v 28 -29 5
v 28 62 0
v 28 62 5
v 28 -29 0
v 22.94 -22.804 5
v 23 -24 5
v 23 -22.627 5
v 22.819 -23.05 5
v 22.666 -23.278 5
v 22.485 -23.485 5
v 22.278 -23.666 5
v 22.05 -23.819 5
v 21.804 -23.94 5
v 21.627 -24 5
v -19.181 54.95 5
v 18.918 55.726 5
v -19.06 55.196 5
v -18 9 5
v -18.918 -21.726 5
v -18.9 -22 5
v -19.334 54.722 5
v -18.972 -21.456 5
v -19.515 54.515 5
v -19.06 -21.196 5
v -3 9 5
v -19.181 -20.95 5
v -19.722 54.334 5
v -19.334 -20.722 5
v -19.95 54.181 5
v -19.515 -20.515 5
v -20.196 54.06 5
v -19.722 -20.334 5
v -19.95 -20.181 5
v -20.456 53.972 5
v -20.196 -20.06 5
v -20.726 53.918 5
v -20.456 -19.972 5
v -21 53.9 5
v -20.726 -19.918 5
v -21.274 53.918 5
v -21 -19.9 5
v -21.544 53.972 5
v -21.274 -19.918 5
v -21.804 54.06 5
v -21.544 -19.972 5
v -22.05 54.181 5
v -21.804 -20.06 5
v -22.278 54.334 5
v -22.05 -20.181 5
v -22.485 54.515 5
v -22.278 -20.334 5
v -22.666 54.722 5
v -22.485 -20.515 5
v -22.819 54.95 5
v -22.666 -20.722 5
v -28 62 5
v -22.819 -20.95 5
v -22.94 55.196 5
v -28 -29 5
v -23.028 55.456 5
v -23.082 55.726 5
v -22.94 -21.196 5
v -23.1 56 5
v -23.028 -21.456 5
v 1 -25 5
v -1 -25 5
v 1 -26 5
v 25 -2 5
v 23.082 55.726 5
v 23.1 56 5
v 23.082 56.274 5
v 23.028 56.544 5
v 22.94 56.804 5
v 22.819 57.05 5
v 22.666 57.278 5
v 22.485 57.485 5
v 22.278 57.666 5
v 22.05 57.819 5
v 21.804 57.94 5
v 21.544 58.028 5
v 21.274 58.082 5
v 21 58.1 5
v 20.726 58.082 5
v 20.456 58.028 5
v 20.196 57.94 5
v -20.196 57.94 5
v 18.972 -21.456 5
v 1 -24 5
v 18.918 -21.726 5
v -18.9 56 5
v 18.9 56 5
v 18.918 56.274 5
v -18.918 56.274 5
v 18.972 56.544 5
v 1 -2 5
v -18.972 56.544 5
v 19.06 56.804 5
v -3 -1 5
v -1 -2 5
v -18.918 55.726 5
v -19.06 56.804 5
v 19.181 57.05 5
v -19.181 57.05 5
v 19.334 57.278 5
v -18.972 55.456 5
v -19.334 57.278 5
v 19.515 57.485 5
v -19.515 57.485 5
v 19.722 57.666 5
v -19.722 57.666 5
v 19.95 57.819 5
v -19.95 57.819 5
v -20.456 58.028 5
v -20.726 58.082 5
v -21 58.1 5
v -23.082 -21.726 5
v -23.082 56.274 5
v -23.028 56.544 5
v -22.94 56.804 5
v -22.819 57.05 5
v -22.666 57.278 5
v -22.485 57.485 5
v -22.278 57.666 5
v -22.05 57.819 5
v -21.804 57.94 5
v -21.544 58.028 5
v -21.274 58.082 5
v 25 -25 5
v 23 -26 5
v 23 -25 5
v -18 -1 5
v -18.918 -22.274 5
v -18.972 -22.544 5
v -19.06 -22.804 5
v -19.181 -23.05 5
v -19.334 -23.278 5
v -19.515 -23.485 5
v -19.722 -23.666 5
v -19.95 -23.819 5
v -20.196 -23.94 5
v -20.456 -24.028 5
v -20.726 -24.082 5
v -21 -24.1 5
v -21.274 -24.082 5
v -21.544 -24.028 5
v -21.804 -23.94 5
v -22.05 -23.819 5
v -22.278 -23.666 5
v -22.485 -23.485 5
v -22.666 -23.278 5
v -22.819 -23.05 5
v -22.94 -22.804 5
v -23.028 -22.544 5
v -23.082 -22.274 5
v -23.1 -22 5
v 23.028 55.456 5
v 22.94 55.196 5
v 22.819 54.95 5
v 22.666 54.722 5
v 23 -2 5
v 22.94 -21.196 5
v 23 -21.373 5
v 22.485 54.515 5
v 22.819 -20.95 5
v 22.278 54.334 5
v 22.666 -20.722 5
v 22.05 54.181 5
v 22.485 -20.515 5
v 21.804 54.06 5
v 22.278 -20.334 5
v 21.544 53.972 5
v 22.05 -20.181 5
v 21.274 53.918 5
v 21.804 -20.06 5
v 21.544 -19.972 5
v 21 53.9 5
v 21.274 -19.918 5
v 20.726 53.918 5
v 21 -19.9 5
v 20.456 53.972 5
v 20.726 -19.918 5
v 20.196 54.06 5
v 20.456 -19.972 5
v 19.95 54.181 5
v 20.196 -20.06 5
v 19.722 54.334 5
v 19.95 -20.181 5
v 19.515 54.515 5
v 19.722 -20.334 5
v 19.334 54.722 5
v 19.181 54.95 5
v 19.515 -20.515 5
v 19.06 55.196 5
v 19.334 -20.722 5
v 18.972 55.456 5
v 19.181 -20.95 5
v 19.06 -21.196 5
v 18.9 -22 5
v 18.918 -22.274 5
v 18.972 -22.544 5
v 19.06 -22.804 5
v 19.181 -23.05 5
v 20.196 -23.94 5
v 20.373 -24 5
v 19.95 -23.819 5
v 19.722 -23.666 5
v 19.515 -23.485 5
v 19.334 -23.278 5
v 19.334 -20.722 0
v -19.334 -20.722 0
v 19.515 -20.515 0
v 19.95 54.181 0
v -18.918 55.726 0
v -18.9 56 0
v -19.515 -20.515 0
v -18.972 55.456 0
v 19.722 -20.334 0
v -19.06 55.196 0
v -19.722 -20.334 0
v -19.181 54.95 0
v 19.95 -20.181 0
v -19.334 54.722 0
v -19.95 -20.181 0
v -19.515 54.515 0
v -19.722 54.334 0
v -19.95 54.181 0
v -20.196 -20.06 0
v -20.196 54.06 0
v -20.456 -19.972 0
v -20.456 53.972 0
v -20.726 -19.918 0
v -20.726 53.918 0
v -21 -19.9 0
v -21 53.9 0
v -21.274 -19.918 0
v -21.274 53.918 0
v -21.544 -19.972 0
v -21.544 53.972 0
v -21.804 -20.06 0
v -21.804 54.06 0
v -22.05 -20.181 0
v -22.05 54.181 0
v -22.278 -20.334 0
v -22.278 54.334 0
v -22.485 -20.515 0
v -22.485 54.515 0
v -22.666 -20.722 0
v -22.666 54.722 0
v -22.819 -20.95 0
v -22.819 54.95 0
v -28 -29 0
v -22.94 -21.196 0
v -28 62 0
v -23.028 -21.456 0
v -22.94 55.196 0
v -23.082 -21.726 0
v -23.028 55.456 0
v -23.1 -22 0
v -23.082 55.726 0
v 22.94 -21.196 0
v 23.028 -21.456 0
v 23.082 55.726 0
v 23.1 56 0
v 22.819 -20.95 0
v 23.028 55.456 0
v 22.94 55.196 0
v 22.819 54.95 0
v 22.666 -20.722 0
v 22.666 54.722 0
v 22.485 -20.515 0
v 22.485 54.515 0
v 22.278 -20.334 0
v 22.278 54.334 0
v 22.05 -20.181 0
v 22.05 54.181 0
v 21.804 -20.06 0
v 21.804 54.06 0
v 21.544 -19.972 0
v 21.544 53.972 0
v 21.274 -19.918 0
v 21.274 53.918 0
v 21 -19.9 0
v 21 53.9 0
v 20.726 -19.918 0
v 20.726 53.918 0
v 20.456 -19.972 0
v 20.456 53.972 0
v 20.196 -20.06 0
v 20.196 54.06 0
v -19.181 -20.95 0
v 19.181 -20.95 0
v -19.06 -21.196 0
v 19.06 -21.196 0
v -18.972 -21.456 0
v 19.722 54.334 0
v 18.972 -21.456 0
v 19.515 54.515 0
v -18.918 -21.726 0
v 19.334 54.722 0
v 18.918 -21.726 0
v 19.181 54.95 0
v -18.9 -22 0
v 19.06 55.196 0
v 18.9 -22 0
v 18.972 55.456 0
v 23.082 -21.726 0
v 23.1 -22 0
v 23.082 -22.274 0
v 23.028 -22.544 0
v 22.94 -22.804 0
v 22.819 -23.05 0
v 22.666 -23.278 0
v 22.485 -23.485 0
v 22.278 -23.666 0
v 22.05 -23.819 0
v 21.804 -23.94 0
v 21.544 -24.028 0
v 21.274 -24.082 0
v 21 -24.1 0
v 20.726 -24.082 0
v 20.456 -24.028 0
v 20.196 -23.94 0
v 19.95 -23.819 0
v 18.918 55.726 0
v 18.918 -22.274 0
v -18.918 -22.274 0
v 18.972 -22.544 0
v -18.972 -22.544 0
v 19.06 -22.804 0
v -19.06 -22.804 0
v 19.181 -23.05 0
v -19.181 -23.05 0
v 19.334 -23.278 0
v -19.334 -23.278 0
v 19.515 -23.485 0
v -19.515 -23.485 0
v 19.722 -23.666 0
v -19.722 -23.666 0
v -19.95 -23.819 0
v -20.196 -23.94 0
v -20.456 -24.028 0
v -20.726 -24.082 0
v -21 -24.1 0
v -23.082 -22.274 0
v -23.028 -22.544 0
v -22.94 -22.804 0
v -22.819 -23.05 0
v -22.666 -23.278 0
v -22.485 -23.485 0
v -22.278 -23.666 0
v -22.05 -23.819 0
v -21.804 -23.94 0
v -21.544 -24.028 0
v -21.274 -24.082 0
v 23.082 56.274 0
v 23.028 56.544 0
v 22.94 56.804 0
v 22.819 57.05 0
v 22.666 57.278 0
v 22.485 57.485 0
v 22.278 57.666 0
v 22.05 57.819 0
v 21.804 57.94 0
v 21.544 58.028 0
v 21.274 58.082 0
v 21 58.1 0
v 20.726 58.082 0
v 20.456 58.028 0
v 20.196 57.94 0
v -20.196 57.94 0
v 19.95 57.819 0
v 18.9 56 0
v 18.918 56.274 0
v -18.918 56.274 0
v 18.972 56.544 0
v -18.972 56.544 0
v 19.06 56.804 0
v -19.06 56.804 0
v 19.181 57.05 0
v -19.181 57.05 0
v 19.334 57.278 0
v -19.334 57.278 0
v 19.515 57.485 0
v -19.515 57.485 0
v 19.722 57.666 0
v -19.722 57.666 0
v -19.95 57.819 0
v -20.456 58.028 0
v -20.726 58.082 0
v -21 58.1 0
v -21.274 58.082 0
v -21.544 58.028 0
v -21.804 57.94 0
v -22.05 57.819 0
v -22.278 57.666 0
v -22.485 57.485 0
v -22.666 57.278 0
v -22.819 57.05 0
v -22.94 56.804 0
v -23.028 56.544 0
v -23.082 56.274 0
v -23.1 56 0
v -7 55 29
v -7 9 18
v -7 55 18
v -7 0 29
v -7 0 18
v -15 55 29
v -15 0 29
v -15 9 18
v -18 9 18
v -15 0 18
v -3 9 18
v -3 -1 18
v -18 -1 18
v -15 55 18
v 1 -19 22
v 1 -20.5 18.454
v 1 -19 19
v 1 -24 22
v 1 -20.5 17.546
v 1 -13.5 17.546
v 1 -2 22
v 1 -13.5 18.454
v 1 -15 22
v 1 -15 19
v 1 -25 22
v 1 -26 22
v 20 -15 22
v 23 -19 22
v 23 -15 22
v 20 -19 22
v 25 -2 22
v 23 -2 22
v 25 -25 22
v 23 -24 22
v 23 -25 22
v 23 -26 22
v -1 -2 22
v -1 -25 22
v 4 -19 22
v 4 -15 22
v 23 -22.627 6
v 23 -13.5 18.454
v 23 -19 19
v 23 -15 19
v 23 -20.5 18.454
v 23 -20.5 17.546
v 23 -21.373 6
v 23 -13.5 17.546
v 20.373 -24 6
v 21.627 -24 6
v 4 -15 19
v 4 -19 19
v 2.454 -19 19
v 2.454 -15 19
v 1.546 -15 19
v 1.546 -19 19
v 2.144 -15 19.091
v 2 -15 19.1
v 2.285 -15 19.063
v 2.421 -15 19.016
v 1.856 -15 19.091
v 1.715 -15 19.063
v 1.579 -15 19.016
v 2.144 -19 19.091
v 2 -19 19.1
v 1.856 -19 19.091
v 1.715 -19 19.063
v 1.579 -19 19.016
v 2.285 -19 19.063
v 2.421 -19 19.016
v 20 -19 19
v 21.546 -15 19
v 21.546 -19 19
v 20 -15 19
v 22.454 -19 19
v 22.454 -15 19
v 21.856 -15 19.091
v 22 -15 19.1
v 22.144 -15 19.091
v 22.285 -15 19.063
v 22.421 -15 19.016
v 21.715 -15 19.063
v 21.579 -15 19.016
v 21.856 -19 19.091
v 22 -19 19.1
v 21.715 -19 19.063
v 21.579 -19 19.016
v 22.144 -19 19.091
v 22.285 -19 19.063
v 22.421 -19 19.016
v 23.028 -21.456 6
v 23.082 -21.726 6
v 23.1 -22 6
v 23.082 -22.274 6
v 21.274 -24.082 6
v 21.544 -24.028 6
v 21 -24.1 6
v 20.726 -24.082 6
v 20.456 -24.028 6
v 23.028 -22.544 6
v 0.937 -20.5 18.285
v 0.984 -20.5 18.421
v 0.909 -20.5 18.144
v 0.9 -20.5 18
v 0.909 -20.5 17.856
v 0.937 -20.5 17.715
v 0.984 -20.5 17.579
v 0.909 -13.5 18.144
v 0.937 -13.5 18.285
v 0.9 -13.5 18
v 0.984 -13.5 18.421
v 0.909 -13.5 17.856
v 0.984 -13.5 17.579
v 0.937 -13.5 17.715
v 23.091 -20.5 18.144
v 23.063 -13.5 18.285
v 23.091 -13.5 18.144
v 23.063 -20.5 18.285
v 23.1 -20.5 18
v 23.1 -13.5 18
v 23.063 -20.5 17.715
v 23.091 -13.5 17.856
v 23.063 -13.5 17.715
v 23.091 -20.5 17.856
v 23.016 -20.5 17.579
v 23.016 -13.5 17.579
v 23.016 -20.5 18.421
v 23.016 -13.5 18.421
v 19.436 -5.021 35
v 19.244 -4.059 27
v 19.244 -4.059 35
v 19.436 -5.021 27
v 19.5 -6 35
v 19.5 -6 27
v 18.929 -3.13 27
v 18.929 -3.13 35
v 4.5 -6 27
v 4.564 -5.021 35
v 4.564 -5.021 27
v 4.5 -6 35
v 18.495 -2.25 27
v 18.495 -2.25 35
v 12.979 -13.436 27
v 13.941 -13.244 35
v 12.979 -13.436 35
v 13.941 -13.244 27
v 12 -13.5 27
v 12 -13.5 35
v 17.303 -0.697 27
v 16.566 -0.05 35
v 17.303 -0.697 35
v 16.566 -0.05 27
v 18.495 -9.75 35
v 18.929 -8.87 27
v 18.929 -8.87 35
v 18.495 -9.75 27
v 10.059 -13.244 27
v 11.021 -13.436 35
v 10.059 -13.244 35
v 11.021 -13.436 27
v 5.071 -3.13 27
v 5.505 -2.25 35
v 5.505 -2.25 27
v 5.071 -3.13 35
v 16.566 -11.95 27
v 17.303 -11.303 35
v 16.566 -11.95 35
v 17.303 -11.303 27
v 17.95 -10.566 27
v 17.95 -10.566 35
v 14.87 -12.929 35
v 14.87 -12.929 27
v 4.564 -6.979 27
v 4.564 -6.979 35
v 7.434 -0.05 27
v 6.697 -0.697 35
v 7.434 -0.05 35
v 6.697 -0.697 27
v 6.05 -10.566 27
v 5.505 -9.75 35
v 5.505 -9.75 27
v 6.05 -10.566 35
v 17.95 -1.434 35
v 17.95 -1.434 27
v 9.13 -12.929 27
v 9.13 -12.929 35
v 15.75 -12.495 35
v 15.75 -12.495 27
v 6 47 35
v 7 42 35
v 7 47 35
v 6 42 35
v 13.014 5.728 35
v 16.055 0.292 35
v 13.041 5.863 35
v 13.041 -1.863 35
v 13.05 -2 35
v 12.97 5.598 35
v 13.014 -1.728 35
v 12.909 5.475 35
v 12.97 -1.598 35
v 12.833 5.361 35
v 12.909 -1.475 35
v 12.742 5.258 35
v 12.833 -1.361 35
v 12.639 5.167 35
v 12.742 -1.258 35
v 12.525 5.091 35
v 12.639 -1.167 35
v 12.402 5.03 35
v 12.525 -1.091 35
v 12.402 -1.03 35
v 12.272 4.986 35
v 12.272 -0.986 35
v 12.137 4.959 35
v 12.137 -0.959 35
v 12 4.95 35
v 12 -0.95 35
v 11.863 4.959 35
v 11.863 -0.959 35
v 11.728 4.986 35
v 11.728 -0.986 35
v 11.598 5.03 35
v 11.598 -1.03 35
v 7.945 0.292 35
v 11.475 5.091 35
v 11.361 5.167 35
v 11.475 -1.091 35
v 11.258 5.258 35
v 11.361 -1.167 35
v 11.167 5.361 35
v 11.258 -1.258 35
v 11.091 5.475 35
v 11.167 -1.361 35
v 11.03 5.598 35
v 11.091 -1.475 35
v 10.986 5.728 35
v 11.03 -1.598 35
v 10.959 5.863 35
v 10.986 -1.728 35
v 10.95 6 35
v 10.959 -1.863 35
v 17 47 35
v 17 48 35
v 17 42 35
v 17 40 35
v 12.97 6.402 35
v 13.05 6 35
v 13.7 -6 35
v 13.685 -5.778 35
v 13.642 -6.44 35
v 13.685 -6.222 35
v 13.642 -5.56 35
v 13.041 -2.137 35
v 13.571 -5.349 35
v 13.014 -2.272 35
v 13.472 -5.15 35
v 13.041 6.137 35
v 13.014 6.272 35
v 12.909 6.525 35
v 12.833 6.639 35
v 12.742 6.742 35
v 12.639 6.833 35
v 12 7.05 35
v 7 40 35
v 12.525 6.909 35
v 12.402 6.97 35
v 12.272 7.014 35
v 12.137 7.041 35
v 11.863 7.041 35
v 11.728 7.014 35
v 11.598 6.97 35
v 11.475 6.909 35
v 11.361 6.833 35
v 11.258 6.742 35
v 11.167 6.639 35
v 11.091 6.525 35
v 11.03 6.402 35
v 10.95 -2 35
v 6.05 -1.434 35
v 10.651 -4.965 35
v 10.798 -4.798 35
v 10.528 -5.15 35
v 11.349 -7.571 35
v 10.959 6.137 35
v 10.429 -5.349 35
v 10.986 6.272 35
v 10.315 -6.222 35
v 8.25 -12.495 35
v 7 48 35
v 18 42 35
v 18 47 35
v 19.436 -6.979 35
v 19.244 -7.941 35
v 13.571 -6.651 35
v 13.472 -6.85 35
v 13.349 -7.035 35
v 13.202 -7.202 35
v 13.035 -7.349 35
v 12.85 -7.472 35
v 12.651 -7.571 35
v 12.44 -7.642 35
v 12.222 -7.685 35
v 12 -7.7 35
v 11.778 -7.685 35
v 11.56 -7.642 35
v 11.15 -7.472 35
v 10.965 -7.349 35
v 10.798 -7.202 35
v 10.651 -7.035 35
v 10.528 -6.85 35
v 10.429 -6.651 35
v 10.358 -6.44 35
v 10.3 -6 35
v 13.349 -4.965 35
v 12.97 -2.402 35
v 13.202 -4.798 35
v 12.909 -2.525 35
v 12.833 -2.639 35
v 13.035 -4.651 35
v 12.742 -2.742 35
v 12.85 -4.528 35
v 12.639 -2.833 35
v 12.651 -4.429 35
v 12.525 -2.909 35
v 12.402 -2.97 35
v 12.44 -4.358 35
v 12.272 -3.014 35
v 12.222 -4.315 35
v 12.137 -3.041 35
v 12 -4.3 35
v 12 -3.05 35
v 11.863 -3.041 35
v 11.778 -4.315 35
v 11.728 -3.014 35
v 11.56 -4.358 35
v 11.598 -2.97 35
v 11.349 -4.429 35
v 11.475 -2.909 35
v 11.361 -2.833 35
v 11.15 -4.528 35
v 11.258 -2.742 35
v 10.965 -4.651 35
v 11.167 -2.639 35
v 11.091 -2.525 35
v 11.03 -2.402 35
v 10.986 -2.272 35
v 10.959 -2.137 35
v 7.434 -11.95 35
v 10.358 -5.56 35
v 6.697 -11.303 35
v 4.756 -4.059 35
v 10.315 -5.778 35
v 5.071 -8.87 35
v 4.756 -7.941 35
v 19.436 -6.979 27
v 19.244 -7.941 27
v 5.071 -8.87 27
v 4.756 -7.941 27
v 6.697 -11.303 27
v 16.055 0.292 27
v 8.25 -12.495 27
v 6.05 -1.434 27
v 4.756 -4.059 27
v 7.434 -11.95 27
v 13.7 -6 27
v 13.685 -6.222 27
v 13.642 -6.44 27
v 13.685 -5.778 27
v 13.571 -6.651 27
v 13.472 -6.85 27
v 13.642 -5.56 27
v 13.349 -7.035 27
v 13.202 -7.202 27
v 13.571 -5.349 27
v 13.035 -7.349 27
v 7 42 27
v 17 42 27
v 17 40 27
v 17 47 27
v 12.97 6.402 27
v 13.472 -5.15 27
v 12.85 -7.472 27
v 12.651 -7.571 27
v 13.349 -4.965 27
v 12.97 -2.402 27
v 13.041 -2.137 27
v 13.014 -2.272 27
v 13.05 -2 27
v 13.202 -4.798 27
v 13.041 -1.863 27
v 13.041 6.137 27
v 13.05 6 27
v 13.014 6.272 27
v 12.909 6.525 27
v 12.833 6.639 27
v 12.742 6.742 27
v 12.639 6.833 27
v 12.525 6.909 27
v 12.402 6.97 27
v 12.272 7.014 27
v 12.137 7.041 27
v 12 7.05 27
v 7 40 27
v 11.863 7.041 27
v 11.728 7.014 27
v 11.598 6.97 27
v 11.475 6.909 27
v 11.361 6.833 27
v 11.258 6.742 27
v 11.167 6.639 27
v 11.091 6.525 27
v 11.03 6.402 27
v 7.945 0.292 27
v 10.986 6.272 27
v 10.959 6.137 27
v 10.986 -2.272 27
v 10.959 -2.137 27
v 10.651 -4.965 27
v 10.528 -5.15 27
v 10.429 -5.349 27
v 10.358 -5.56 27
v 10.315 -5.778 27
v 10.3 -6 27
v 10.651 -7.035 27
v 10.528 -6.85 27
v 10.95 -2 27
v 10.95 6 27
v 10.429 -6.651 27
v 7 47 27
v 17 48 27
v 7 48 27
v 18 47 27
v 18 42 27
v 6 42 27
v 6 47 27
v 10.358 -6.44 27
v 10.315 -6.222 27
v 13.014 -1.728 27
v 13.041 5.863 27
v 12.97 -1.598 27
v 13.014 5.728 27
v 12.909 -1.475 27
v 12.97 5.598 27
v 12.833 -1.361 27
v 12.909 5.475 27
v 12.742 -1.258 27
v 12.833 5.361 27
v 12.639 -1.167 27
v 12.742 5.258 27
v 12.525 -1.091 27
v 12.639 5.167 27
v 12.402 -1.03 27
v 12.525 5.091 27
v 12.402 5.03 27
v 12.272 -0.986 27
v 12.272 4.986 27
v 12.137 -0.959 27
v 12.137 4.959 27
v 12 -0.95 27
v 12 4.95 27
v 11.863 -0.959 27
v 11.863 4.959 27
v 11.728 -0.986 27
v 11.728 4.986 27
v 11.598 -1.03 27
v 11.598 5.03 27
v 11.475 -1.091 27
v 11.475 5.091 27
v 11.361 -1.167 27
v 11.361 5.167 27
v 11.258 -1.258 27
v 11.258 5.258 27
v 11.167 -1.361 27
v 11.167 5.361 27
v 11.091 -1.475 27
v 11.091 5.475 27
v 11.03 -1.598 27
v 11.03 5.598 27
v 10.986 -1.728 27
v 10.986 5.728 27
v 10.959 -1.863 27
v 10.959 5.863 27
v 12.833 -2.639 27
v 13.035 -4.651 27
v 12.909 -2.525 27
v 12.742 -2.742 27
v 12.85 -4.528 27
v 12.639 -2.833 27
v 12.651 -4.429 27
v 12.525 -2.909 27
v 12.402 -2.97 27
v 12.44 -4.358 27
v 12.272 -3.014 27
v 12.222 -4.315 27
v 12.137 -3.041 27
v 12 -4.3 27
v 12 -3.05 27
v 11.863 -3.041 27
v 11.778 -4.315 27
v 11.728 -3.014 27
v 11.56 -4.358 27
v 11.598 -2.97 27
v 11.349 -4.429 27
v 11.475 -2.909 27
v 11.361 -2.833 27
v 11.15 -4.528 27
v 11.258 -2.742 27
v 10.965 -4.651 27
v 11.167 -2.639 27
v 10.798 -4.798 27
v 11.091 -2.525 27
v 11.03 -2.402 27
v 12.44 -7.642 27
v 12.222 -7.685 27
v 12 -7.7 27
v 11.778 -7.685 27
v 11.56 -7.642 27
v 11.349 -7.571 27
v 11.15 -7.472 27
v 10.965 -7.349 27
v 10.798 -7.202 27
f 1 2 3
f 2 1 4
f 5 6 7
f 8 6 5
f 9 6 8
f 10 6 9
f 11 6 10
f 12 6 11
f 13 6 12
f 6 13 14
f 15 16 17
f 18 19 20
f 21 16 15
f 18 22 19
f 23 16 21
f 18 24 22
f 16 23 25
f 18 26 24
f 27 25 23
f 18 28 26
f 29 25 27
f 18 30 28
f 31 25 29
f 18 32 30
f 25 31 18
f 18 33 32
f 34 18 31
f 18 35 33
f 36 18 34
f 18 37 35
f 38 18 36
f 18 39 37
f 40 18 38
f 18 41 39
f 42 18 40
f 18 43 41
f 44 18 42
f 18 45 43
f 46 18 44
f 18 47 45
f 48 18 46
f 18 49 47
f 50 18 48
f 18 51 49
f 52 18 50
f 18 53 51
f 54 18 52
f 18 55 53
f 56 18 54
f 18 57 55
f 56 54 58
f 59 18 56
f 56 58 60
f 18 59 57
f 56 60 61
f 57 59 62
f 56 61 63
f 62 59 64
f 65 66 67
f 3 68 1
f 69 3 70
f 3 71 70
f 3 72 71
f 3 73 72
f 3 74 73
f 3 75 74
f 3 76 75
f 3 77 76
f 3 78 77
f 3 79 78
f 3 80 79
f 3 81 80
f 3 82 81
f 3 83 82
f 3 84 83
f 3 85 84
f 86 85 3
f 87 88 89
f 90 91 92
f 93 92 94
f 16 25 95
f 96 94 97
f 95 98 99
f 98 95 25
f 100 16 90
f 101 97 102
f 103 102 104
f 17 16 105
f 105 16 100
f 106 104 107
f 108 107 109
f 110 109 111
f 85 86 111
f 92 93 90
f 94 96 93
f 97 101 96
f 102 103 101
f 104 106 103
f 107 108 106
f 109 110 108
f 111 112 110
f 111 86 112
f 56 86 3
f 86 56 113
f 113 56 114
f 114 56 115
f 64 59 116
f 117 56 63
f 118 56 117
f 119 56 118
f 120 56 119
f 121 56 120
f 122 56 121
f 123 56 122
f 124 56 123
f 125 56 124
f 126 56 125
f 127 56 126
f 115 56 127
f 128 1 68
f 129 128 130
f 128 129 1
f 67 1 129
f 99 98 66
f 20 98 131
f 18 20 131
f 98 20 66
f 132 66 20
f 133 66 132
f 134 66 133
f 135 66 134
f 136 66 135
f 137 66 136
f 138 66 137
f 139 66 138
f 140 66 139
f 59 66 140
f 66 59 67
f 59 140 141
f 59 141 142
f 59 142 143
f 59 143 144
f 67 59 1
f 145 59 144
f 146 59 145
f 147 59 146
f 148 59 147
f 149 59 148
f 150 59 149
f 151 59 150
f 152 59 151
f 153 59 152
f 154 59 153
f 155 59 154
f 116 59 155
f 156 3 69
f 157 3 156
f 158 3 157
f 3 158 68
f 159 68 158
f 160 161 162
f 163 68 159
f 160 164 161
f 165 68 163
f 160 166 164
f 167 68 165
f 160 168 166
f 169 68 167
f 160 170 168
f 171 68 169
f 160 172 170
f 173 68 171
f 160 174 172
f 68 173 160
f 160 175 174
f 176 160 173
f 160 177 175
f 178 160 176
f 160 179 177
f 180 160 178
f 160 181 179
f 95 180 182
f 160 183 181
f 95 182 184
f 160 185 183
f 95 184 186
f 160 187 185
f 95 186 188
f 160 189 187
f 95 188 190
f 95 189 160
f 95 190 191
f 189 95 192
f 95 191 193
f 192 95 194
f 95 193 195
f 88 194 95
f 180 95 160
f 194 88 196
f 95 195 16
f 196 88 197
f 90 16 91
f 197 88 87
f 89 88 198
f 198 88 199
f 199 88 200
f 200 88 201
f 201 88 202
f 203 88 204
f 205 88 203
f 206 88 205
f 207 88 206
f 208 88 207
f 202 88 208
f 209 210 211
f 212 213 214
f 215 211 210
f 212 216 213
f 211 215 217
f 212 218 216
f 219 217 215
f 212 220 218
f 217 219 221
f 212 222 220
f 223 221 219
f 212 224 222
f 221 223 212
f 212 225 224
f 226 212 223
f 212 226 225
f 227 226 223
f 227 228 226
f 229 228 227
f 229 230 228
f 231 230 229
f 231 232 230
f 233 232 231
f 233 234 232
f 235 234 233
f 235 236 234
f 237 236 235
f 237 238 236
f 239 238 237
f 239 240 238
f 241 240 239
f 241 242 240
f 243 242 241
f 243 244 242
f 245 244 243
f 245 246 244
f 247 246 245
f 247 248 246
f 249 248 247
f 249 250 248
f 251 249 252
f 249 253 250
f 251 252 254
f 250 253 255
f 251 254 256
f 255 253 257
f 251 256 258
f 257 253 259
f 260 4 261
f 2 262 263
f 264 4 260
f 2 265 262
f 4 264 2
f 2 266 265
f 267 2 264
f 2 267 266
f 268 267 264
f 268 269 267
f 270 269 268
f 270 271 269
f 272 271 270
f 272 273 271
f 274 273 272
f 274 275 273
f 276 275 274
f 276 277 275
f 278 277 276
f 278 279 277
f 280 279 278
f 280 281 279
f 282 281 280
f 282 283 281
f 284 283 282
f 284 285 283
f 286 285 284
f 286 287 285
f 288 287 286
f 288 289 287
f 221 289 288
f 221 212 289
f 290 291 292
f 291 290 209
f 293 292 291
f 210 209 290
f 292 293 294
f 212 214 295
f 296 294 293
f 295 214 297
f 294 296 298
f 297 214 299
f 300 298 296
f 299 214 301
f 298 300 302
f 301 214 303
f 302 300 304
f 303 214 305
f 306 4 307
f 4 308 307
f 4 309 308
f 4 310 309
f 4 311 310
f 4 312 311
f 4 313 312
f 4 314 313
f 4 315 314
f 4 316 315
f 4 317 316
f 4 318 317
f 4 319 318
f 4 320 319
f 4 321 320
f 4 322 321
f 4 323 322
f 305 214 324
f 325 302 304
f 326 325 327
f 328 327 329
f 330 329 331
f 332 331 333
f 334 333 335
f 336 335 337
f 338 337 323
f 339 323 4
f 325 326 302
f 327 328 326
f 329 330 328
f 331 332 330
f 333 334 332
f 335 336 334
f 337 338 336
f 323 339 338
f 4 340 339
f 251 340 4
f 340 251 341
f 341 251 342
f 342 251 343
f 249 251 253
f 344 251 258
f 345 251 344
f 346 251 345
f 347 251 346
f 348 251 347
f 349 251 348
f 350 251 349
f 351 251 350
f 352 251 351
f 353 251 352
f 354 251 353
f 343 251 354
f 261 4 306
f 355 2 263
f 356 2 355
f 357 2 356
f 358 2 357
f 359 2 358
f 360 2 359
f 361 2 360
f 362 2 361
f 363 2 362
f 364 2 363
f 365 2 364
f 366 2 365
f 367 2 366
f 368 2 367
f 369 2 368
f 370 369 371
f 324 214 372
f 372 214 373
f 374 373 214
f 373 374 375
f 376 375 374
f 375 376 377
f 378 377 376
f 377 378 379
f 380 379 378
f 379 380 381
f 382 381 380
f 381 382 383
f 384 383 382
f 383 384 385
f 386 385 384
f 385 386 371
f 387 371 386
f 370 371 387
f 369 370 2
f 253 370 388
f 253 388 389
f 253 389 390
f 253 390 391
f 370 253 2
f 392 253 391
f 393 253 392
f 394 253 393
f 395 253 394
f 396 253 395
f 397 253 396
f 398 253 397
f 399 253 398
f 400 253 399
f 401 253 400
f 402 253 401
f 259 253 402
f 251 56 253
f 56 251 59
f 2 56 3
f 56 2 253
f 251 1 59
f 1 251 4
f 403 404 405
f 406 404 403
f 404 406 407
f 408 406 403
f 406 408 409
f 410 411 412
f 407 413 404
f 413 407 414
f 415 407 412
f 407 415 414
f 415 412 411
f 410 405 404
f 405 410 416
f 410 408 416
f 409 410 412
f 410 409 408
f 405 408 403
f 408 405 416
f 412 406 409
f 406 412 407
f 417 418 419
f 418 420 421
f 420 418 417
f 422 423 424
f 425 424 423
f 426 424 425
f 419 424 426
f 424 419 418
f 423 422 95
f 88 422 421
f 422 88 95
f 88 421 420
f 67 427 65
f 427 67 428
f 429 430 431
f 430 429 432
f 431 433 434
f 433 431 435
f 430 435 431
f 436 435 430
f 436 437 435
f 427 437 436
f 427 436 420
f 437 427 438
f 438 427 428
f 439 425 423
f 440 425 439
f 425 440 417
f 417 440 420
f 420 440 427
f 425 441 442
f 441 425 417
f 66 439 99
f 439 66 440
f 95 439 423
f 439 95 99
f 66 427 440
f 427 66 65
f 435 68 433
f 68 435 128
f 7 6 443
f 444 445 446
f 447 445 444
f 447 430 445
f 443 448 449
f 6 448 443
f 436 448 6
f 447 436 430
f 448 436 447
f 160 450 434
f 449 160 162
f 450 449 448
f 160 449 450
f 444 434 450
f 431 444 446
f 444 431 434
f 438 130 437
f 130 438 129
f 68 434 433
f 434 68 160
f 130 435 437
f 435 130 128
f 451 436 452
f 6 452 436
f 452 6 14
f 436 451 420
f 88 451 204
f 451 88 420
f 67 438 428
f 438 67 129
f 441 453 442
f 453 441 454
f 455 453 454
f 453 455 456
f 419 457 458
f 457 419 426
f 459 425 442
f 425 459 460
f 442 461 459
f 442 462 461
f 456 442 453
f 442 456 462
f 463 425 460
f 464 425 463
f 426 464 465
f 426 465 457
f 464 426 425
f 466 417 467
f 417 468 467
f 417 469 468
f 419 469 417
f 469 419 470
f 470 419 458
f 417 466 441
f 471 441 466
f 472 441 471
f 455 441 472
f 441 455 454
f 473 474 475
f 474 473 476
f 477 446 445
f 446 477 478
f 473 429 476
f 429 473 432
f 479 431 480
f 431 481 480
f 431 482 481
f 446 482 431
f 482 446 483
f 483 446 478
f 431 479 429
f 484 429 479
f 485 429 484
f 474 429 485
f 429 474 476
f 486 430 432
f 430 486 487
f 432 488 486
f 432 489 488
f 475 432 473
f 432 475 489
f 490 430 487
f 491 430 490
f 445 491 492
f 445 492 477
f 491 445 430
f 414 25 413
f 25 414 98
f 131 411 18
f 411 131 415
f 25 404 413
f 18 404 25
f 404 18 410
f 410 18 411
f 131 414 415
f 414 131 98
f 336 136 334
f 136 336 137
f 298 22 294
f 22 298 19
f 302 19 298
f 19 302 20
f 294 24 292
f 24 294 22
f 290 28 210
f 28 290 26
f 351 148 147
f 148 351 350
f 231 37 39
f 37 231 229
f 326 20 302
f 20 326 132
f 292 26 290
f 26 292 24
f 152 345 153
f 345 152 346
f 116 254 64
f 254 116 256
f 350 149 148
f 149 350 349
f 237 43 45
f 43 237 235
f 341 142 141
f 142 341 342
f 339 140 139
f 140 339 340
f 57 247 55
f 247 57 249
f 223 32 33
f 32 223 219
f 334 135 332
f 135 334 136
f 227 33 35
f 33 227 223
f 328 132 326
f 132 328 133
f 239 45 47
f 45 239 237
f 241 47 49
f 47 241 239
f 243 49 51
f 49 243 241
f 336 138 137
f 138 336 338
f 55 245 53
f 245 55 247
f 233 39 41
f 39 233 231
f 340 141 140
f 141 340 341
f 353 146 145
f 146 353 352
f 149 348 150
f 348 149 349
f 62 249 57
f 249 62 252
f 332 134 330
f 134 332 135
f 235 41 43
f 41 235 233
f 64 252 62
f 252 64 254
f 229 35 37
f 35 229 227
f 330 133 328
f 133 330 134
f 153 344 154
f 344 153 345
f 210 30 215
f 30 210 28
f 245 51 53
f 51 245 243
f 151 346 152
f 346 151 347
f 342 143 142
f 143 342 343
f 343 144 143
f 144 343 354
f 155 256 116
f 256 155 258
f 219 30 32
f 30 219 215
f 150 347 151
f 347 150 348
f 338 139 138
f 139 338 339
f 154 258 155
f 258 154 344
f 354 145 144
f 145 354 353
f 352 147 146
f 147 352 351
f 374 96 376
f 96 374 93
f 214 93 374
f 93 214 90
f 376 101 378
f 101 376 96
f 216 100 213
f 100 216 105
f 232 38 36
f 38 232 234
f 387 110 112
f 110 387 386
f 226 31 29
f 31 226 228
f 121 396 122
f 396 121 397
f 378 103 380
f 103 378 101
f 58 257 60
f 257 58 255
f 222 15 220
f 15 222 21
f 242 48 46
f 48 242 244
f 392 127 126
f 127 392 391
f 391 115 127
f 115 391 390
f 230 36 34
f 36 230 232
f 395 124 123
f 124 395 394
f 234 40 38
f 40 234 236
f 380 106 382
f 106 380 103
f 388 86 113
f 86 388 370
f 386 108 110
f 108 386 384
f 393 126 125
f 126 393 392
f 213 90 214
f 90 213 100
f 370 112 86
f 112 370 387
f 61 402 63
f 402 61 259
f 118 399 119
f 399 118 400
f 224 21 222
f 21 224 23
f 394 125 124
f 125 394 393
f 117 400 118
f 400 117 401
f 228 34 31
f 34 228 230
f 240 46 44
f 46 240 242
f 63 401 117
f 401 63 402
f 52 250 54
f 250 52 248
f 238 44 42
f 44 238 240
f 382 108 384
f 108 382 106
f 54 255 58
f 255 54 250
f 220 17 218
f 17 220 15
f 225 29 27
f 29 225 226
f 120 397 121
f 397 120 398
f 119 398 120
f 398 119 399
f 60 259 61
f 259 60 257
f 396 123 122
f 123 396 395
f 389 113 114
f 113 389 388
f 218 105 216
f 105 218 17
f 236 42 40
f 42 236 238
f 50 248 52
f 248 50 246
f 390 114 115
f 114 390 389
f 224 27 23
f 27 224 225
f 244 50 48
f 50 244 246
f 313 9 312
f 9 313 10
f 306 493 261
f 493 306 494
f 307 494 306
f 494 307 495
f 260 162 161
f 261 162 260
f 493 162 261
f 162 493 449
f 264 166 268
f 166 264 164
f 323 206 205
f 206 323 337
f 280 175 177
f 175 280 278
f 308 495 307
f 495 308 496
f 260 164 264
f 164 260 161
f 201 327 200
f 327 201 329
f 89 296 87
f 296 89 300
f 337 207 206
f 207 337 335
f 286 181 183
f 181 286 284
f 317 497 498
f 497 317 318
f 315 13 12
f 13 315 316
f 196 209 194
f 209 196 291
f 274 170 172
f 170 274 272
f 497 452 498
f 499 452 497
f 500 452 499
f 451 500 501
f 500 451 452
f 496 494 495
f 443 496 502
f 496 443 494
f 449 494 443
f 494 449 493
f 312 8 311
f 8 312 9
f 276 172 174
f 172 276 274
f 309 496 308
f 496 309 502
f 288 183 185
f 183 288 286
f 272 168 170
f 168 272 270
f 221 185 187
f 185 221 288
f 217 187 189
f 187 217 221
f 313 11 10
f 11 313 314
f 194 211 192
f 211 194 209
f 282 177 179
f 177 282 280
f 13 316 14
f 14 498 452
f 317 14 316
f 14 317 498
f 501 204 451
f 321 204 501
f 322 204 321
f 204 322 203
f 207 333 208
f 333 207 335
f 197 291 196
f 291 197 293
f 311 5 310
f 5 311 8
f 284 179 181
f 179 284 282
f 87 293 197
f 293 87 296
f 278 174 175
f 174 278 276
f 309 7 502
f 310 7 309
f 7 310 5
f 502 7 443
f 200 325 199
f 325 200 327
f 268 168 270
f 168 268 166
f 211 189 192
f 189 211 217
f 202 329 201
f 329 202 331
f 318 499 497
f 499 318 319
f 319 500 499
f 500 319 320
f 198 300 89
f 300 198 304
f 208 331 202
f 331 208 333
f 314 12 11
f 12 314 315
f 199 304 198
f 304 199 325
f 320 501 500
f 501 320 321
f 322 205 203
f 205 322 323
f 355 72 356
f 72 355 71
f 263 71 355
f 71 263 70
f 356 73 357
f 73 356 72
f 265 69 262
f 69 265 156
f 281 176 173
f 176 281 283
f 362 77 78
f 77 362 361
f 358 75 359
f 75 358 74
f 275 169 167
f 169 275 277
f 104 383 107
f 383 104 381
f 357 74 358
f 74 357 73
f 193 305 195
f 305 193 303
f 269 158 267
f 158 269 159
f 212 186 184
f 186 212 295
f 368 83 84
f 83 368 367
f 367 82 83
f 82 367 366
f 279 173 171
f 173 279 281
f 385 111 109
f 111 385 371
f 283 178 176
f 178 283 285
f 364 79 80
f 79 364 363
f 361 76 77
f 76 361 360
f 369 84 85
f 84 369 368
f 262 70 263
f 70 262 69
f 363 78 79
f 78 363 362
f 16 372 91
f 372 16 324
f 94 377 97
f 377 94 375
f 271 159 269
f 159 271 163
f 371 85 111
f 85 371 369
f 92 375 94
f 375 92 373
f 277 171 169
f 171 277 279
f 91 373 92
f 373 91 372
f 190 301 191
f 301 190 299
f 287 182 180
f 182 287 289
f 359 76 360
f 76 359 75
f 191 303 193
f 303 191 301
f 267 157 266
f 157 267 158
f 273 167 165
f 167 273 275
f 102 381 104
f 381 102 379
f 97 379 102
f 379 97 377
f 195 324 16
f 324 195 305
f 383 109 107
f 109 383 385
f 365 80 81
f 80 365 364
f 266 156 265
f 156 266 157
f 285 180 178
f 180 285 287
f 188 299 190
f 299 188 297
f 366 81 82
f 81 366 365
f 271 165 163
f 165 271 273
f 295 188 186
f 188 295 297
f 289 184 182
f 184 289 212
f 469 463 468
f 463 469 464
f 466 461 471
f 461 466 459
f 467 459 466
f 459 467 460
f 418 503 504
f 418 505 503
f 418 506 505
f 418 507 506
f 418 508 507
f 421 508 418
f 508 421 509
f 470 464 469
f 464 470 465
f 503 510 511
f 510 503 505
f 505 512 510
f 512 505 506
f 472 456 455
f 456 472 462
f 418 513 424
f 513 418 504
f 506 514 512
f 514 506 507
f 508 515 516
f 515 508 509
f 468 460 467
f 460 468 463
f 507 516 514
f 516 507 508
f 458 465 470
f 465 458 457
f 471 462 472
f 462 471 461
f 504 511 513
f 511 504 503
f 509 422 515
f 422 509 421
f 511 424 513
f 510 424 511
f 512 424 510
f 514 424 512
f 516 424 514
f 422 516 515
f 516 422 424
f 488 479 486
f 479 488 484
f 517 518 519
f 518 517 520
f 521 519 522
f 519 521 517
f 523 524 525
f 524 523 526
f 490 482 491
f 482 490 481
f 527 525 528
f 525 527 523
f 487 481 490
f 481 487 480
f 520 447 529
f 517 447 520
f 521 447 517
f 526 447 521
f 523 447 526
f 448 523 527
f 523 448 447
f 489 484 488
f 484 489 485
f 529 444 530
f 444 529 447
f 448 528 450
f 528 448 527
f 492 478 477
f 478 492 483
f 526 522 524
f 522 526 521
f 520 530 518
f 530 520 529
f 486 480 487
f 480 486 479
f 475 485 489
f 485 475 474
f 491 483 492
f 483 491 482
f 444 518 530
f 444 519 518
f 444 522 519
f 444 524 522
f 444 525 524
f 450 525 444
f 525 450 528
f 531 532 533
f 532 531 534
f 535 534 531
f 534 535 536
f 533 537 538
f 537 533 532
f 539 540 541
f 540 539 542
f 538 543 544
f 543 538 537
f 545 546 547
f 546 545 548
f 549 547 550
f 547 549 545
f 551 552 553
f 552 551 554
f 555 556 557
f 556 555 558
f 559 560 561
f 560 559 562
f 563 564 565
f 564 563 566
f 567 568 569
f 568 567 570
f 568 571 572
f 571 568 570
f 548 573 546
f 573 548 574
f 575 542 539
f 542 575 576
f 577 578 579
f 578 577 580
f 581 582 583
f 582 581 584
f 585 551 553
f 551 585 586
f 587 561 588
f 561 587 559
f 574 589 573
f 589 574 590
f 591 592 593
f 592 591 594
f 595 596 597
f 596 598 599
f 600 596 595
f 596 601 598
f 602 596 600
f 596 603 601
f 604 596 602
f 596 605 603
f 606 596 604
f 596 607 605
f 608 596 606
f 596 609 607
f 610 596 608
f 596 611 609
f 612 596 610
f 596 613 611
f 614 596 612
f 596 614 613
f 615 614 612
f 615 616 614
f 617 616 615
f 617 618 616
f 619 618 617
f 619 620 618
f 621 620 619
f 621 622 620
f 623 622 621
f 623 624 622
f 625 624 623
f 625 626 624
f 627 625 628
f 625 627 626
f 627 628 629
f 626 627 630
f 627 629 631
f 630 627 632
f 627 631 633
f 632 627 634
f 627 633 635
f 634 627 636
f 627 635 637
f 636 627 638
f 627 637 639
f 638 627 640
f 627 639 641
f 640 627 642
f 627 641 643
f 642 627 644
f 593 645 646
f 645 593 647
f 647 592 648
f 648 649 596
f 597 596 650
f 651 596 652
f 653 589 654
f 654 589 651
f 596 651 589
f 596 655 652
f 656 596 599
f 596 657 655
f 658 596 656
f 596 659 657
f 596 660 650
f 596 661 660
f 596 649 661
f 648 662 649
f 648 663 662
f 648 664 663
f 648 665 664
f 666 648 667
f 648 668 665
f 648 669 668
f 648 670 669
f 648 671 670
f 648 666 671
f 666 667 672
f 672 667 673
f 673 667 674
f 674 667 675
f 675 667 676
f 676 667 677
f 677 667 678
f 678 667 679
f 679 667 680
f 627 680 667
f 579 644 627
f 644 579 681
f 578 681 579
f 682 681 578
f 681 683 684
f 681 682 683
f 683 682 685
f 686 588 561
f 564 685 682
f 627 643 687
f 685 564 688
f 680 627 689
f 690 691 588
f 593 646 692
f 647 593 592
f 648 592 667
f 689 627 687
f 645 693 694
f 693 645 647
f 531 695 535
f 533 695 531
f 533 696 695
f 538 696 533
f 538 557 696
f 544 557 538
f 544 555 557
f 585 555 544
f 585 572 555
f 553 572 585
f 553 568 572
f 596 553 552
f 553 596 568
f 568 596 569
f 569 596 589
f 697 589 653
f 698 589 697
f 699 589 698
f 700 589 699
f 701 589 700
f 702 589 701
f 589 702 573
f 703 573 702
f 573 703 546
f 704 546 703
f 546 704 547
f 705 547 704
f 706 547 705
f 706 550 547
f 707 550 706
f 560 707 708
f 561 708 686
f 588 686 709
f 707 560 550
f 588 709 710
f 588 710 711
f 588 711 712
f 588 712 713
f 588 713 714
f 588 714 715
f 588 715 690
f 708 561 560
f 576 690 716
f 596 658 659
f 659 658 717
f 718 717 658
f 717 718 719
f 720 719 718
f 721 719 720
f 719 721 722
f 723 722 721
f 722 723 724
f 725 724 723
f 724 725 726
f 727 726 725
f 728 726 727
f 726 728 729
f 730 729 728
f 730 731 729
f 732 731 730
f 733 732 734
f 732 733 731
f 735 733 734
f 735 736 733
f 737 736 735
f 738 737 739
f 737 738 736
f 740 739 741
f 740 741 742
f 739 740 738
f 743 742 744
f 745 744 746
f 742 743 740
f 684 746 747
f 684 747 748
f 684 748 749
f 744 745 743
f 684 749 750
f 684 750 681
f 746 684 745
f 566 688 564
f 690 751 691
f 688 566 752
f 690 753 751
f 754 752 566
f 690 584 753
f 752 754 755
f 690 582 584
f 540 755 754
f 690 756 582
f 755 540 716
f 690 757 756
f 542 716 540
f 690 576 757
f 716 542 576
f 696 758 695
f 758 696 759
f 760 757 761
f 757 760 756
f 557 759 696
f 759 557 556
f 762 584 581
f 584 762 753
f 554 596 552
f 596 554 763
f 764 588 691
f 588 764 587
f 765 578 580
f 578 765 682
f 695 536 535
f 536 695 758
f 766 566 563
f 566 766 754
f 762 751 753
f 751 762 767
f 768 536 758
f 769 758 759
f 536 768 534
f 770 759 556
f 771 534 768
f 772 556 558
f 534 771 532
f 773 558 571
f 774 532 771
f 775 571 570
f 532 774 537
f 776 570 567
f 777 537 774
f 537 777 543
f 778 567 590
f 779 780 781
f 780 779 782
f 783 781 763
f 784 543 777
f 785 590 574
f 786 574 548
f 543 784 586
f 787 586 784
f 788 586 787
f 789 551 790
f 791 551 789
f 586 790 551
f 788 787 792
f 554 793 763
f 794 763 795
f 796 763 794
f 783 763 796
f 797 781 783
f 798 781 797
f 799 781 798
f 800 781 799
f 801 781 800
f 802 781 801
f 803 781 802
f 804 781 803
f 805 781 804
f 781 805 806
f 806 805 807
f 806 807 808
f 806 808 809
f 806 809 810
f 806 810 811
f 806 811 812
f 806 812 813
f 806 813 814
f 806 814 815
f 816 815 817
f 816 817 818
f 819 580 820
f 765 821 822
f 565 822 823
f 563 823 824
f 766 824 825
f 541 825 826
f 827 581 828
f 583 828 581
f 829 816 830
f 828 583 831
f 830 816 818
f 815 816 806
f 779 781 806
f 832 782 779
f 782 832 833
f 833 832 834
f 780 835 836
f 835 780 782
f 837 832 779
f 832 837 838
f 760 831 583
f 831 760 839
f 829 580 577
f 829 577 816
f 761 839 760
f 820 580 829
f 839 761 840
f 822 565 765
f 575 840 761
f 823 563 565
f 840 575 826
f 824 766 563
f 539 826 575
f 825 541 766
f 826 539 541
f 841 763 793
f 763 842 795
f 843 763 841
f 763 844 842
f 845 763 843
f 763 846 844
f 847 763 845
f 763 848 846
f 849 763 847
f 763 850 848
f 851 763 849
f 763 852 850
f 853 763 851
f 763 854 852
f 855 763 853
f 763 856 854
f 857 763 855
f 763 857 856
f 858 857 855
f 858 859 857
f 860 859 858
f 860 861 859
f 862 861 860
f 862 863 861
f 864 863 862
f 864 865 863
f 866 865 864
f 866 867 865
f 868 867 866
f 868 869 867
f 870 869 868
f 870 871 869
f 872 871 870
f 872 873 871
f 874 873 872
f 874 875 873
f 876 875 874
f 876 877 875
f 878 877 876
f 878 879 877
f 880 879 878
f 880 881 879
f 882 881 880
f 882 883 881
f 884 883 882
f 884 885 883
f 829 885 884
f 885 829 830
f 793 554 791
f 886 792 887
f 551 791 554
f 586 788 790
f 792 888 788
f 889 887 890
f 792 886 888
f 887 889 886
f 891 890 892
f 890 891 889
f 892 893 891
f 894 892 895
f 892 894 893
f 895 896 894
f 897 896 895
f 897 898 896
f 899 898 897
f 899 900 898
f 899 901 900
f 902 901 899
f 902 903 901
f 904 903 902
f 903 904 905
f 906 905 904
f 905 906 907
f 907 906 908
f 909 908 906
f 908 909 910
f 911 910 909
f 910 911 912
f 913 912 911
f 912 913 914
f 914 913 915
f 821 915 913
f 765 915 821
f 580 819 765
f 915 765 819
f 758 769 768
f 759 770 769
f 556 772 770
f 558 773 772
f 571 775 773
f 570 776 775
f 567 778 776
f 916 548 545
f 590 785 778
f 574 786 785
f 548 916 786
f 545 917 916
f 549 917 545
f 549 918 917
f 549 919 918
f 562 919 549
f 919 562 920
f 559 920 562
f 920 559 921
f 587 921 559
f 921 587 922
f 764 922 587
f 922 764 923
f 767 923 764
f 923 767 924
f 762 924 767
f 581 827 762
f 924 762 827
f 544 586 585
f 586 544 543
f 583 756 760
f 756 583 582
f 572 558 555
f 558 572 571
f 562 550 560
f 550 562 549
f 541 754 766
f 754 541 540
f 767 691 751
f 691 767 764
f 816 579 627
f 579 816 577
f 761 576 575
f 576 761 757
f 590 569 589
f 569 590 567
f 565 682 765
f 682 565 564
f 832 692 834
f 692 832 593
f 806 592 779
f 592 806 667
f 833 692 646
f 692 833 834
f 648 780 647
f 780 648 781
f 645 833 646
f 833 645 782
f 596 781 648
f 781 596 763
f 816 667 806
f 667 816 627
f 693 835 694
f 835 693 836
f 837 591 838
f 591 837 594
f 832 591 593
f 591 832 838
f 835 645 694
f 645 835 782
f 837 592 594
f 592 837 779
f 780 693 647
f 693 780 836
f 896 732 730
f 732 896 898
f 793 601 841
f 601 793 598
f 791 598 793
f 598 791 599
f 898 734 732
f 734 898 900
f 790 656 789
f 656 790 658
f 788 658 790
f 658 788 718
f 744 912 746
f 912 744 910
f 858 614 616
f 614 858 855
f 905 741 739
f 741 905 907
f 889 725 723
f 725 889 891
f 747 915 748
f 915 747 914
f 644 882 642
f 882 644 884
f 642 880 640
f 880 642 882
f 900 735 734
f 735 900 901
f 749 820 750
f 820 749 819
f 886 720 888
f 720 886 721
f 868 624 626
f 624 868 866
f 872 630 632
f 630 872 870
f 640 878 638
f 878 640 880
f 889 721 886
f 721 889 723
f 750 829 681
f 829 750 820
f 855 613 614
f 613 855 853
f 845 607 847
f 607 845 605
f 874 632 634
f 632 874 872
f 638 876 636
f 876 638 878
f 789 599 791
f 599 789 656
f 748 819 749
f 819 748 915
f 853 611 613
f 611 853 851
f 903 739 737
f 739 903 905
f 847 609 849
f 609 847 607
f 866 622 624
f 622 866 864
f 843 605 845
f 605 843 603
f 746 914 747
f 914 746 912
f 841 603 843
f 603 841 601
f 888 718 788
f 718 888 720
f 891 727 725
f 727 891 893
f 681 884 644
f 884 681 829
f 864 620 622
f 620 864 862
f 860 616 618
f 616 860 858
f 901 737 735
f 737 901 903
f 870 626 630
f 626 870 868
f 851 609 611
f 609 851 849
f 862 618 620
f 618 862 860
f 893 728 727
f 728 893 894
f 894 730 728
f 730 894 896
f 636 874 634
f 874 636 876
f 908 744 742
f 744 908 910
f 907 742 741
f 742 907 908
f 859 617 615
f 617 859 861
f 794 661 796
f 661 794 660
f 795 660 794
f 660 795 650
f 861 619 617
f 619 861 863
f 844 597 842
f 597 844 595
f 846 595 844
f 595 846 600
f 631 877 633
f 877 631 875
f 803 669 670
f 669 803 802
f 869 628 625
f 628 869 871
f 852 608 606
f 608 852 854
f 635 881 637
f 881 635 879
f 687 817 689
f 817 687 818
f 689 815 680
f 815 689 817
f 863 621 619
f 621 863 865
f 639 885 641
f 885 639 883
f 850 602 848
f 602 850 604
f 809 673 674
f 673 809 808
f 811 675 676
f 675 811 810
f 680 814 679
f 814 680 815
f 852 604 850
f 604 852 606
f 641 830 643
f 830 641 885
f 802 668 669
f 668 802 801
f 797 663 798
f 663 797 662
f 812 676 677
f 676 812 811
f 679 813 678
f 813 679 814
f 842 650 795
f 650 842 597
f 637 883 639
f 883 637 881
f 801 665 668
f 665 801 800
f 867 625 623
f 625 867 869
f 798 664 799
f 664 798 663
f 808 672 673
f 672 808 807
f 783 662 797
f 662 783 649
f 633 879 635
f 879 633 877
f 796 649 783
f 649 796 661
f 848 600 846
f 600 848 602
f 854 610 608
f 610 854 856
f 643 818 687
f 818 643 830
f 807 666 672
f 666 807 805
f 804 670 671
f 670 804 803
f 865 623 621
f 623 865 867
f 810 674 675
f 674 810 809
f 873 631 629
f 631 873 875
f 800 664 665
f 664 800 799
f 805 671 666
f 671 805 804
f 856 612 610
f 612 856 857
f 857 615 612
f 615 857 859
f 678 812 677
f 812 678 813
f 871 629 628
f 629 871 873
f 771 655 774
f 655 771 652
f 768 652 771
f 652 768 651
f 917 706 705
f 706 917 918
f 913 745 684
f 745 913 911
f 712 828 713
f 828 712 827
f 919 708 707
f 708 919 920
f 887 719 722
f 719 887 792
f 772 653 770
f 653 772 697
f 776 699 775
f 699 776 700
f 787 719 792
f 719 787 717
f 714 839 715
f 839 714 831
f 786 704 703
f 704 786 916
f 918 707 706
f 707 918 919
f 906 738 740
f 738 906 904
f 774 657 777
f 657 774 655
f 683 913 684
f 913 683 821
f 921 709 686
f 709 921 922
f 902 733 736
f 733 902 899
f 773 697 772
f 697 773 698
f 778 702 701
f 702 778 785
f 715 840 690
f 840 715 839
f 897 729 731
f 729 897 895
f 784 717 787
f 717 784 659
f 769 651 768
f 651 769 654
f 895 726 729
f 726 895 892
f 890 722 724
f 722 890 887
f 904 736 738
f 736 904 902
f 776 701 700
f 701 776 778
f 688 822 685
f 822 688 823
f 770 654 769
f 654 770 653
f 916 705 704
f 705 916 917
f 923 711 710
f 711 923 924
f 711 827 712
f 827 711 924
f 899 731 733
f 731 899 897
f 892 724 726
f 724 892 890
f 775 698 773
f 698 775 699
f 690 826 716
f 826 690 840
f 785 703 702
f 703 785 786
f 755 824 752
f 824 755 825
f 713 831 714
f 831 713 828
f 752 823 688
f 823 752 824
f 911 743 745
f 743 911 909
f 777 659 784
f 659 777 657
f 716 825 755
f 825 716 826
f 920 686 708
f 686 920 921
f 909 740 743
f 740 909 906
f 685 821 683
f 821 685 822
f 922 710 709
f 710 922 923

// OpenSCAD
// SG90 Quick Gripper: single fixed finger + one direct-drive moving finger
// Units: mm. Designed as a low-part-count classroom / competition prototype.
// Print base and moving_jaw separately; moving_jaw bolts to a standard SG90 single-arm horn.
$fn = 48;
part = "assembly"; // [assembly,base,moving_jaw]
open_angle = 0;       // preview pose, degrees from forward
closed_angle = 20;    // rotate servo horn to this angle for a narrow grip
jaw_angle = open_angle;
plate_t = 5;

module base() {
  difference() {
    union() {
      // Flat, printable mounting plate
      translate([-28,-29,0]) cube([56,91,plate_t]);
      // Fixed finger, aligned parallel with the moving finger when open
      translate([-15,0,18]) cube([8,55,11]);
      // SG90 cradle: low side rails and rear stop for a servo sitting upright
      translate([-1,-25,plate_t]) cube([2,23,17]);
      translate([23,-25,plate_t]) cube([2,23,17]);
      translate([1,-26,plate_t]) cube([22,2,17]);
      // Thin retaining tabs over the servo mounting ears (M2 clearance)
      translate([0,-19,19]) cube([4,4,3]);
      translate([20,-19,19]) cube([4,4,3]);
      // Reinforce the fixed finger root
      translate([-18,-1,plate_t]) cube([15,10,13]);
    }
    // Four base mounting holes
    for (x=[-21,21], y=[-22,56]) translate([x,y,-1]) cylinder(d=4.2,h=plate_t+2);
    // SG90 ear screw holes through the retaining tabs
    for (x=[2,22]) translate([x,-17,18]) rotate([90,0,0]) cylinder(d=2.2,h=7,center=true);
  }
}

module moving_jaw() {
  difference() {
    union() {
      // Circular servo-horn hub, centered on the SG90 output shaft
      cylinder(d=15,h=8);
      // Broad, tapered finger. The angle is adjusted in assembly for open/closed poses.
      translate([-4,4,0]) hull() {
        cube([8,5,8]);
        translate([-1,42,0]) cube([10,8,8]);
      }
      // Soft-pad seat at the fingertip
      translate([-6,48,0]) cube([12,5,8]);
    }
    // SG90 horn center screw and a pair of M2 horn holes on an 8 mm pitch
    translate([0,0,-1]) cylinder(d=3.4,h=10);
    for (y=[4,12]) translate([0,y,-1]) cylinder(d=2.1,h=10);
  }
}

if (part == "base") base();
else if (part == "moving_jaw") moving_jaw();
else {
  base();
  // Preview moving jaw at its selected servo angle; export individual parts for printing.
  translate([12,-6,27]) rotate([0,0,jaw_angle]) moving_jaw();
  // SG90 envelope shown only in preview (not part of printable geometry)
  %translate([1,-24,5]) cube([23,12,22.5]);
}
